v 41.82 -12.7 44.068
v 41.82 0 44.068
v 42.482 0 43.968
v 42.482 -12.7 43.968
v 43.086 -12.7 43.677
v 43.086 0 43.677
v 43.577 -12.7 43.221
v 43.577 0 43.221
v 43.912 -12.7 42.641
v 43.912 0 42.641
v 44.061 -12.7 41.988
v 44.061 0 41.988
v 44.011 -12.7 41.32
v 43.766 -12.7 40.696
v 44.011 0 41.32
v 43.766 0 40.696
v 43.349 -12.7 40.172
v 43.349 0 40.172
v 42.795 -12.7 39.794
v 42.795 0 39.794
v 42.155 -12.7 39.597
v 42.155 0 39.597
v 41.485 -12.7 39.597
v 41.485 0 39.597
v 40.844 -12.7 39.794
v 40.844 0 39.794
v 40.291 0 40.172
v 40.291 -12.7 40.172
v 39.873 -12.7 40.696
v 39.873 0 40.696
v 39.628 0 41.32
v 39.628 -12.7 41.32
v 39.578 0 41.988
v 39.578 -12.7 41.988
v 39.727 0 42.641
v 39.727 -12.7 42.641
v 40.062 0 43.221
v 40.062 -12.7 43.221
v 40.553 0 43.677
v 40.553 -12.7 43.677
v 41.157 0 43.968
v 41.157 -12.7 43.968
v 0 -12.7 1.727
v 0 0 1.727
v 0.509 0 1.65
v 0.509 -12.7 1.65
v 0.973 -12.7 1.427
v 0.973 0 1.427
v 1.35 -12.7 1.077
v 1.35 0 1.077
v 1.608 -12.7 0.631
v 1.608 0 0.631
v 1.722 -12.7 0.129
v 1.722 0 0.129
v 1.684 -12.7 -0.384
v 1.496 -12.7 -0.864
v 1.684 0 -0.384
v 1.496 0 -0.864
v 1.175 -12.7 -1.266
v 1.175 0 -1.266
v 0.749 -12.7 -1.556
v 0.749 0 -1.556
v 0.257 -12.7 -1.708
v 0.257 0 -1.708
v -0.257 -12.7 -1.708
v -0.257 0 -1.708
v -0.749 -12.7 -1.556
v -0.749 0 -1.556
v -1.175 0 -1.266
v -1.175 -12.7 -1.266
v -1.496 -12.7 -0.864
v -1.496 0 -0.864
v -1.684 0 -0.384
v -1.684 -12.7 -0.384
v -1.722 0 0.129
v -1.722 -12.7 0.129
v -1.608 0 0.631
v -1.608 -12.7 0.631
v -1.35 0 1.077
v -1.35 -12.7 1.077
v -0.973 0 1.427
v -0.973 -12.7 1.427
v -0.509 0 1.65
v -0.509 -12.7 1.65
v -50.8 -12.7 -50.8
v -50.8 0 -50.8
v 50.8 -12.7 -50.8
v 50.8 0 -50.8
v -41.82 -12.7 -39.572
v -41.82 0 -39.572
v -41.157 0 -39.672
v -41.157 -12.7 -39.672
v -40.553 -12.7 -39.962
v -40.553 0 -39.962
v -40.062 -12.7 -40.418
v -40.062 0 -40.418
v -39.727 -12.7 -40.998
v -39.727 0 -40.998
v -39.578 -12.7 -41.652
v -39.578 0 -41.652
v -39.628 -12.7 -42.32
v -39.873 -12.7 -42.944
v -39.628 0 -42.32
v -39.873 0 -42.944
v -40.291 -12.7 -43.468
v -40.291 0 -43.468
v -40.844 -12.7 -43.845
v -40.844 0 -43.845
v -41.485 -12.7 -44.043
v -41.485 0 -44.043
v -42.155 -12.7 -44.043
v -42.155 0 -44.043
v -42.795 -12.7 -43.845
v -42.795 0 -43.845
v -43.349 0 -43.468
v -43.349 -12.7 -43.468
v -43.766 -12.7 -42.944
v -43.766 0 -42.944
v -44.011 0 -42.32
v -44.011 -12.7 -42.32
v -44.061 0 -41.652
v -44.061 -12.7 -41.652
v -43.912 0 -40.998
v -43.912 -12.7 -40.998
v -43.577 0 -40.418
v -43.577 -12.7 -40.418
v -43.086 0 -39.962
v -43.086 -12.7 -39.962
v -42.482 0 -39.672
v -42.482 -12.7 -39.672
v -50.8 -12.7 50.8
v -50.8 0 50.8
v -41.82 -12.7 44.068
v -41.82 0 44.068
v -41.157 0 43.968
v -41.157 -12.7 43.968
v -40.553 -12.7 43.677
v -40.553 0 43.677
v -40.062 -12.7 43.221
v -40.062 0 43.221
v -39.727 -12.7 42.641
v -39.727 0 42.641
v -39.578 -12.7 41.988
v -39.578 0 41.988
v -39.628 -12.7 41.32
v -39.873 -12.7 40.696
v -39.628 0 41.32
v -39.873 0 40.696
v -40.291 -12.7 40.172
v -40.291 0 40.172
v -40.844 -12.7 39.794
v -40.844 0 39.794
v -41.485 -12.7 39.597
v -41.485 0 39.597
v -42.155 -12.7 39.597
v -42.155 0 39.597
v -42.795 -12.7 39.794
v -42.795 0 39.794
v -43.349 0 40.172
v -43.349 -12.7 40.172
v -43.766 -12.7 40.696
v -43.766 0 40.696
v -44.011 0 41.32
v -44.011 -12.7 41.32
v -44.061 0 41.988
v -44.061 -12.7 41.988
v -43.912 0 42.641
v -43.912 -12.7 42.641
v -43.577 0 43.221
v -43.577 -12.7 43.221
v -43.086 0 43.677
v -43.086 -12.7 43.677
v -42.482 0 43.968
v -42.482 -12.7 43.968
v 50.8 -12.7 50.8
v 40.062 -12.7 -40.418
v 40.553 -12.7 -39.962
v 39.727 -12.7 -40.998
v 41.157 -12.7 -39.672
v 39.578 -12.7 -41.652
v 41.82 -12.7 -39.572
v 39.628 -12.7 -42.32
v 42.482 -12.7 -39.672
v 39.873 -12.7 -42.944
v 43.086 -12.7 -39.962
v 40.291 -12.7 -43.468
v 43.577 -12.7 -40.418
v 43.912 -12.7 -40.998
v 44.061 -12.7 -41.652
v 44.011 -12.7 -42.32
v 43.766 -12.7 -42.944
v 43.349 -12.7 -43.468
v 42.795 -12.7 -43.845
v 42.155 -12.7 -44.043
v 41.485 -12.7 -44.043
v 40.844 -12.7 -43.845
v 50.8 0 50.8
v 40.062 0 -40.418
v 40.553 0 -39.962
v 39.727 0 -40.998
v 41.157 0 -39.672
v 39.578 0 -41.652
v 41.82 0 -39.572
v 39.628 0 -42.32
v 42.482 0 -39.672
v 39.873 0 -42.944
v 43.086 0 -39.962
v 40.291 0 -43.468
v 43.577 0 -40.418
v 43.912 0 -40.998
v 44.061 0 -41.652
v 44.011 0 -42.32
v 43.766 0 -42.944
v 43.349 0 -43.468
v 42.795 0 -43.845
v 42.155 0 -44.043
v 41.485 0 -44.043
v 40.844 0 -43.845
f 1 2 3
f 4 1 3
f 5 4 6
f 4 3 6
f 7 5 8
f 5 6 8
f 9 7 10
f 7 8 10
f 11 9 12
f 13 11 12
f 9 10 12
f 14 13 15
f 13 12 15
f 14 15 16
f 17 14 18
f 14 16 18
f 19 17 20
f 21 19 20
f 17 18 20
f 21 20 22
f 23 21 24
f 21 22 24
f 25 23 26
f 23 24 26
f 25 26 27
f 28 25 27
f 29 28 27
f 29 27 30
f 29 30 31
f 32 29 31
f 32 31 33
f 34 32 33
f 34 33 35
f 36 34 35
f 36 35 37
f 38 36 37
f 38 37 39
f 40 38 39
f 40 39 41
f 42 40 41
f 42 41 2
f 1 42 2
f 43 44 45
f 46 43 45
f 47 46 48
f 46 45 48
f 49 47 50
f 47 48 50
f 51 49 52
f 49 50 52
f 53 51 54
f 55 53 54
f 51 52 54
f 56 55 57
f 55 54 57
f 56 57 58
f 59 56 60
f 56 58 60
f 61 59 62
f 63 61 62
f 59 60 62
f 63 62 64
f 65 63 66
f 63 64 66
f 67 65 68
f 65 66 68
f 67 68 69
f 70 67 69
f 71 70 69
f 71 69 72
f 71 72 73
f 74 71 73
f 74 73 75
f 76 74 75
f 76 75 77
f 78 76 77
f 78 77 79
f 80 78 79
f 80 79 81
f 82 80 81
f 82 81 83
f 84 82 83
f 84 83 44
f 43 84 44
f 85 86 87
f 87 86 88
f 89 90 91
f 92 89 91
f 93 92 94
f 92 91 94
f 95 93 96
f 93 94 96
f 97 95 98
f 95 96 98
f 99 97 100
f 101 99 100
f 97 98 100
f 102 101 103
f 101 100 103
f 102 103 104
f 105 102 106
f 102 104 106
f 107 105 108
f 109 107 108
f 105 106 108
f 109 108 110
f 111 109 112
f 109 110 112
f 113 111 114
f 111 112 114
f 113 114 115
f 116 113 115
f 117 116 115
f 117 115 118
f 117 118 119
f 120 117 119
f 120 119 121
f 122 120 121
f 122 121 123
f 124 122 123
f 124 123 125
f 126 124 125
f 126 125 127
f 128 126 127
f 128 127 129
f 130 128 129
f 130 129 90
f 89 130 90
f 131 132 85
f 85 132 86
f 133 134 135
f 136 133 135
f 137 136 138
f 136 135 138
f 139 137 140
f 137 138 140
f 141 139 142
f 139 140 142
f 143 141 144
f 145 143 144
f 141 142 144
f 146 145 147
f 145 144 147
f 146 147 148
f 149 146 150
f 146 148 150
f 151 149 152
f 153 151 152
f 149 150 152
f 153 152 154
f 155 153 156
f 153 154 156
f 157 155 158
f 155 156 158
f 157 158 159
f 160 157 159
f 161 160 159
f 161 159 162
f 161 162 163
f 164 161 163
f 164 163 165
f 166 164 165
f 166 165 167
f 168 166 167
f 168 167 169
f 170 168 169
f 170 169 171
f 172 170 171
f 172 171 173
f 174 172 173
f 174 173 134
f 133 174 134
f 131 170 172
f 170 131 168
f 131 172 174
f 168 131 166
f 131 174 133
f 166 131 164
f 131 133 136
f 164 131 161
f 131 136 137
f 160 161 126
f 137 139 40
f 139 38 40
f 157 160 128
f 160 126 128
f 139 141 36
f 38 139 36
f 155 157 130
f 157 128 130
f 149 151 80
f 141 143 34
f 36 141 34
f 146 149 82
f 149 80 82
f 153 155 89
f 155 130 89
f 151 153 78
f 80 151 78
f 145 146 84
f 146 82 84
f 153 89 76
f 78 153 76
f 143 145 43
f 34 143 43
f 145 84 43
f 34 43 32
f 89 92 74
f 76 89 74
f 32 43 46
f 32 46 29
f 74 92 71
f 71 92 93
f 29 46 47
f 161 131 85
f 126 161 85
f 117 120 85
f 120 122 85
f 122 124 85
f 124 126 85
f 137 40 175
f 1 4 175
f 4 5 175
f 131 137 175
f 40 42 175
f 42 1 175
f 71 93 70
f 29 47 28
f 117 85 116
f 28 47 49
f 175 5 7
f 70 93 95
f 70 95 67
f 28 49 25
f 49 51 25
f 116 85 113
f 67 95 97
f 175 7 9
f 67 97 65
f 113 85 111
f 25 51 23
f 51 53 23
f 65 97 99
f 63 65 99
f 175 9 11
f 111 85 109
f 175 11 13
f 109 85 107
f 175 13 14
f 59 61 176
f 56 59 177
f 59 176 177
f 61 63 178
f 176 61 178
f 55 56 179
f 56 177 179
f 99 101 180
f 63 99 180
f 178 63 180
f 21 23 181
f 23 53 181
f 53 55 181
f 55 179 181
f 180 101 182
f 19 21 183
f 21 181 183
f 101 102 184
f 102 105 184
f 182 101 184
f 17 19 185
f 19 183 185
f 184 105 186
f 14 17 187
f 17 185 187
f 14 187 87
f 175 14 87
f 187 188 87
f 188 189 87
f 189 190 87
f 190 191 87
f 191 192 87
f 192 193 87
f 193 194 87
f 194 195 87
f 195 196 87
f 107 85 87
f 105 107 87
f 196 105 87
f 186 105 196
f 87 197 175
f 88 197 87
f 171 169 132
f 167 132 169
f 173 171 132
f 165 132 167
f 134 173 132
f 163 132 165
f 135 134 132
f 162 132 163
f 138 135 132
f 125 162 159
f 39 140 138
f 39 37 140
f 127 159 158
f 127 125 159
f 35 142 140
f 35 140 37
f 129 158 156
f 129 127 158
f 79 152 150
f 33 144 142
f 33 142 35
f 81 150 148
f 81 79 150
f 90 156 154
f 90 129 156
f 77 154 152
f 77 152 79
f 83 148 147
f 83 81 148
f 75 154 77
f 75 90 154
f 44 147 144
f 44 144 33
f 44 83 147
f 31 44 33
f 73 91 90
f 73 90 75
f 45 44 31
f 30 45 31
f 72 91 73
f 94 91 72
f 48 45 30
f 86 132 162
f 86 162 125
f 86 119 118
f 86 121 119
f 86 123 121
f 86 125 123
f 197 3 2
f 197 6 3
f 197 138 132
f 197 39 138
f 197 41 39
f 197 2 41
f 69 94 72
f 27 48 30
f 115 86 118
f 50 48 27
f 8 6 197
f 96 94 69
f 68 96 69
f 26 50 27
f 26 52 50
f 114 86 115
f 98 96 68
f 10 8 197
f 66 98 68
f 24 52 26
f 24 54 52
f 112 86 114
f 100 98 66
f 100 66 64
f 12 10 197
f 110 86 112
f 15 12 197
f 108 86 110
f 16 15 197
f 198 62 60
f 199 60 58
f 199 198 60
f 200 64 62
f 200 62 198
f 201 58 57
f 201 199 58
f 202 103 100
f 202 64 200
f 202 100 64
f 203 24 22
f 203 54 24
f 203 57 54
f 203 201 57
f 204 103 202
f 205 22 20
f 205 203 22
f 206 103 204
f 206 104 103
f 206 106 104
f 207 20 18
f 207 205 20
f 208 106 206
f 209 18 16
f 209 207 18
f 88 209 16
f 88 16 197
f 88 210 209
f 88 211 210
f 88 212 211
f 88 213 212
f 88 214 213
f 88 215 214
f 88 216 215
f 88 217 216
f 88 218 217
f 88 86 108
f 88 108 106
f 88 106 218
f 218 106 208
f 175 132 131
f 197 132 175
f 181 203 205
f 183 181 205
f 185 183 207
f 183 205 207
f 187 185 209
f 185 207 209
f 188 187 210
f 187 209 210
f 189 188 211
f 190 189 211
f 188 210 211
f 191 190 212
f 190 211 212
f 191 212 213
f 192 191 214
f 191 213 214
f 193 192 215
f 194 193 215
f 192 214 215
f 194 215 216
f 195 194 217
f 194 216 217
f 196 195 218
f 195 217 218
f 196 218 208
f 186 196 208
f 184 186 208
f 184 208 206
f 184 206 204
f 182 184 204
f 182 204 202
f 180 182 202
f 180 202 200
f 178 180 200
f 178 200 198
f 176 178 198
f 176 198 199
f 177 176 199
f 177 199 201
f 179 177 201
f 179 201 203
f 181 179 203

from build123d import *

# Parameters (mm, degrees)
SKETCH1_W           = 101.6
SKETCH1_H           = 101.6
BOSS_EXTRUDE1_DEPTH = 12.7
SKETCH3_R           = 2.2479
SKETCH3_R_2         = 1.7272
CUT_EXTRUDE1_DEPTH  = 73.955945611


with BuildPart() as part:
    # Sketch1 → Boss-Extrude1 (new body)
    with BuildSketch(Plane(origin=(0, 0, 0), x_dir=(1, 0, 0), z_dir=(0, 1, 0))):
        Rectangle(SKETCH1_W, SKETCH1_H)
    extrude(amount=-BOSS_EXTRUDE1_DEPTH)

    # Sketch3 → Cut-Extrude1 (cut, through all)
    with BuildSketch(Plane(origin=(0, 0, 0), x_dir=(1, 0, 0), z_dir=(0, 1, 0))):
        with Locations(Location((-41.819743879, 41.819743879, 0), (0, 0, 270))):
            Circle(SKETCH3_R)
        with Locations(Location((41.819743879, 41.819743879, 0), (0, 0, 270))):
            Circle(SKETCH3_R)
        with Locations(Location((41.819743879, -41.819743879, 0), (0, 0, 270))):
            Circle(SKETCH3_R)
        with Locations(Location((-41.819743879, -41.819743879, 0), (0, 0, 270))):
            Circle(SKETCH3_R)
        with Locations(Location((0, 0, 0), (0, 0, 270))):
            Circle(SKETCH3_R_2)
    extrude(amount=-CUT_EXTRUDE1_DEPTH, mode=Mode.SUBTRACT)


solid = part.part
